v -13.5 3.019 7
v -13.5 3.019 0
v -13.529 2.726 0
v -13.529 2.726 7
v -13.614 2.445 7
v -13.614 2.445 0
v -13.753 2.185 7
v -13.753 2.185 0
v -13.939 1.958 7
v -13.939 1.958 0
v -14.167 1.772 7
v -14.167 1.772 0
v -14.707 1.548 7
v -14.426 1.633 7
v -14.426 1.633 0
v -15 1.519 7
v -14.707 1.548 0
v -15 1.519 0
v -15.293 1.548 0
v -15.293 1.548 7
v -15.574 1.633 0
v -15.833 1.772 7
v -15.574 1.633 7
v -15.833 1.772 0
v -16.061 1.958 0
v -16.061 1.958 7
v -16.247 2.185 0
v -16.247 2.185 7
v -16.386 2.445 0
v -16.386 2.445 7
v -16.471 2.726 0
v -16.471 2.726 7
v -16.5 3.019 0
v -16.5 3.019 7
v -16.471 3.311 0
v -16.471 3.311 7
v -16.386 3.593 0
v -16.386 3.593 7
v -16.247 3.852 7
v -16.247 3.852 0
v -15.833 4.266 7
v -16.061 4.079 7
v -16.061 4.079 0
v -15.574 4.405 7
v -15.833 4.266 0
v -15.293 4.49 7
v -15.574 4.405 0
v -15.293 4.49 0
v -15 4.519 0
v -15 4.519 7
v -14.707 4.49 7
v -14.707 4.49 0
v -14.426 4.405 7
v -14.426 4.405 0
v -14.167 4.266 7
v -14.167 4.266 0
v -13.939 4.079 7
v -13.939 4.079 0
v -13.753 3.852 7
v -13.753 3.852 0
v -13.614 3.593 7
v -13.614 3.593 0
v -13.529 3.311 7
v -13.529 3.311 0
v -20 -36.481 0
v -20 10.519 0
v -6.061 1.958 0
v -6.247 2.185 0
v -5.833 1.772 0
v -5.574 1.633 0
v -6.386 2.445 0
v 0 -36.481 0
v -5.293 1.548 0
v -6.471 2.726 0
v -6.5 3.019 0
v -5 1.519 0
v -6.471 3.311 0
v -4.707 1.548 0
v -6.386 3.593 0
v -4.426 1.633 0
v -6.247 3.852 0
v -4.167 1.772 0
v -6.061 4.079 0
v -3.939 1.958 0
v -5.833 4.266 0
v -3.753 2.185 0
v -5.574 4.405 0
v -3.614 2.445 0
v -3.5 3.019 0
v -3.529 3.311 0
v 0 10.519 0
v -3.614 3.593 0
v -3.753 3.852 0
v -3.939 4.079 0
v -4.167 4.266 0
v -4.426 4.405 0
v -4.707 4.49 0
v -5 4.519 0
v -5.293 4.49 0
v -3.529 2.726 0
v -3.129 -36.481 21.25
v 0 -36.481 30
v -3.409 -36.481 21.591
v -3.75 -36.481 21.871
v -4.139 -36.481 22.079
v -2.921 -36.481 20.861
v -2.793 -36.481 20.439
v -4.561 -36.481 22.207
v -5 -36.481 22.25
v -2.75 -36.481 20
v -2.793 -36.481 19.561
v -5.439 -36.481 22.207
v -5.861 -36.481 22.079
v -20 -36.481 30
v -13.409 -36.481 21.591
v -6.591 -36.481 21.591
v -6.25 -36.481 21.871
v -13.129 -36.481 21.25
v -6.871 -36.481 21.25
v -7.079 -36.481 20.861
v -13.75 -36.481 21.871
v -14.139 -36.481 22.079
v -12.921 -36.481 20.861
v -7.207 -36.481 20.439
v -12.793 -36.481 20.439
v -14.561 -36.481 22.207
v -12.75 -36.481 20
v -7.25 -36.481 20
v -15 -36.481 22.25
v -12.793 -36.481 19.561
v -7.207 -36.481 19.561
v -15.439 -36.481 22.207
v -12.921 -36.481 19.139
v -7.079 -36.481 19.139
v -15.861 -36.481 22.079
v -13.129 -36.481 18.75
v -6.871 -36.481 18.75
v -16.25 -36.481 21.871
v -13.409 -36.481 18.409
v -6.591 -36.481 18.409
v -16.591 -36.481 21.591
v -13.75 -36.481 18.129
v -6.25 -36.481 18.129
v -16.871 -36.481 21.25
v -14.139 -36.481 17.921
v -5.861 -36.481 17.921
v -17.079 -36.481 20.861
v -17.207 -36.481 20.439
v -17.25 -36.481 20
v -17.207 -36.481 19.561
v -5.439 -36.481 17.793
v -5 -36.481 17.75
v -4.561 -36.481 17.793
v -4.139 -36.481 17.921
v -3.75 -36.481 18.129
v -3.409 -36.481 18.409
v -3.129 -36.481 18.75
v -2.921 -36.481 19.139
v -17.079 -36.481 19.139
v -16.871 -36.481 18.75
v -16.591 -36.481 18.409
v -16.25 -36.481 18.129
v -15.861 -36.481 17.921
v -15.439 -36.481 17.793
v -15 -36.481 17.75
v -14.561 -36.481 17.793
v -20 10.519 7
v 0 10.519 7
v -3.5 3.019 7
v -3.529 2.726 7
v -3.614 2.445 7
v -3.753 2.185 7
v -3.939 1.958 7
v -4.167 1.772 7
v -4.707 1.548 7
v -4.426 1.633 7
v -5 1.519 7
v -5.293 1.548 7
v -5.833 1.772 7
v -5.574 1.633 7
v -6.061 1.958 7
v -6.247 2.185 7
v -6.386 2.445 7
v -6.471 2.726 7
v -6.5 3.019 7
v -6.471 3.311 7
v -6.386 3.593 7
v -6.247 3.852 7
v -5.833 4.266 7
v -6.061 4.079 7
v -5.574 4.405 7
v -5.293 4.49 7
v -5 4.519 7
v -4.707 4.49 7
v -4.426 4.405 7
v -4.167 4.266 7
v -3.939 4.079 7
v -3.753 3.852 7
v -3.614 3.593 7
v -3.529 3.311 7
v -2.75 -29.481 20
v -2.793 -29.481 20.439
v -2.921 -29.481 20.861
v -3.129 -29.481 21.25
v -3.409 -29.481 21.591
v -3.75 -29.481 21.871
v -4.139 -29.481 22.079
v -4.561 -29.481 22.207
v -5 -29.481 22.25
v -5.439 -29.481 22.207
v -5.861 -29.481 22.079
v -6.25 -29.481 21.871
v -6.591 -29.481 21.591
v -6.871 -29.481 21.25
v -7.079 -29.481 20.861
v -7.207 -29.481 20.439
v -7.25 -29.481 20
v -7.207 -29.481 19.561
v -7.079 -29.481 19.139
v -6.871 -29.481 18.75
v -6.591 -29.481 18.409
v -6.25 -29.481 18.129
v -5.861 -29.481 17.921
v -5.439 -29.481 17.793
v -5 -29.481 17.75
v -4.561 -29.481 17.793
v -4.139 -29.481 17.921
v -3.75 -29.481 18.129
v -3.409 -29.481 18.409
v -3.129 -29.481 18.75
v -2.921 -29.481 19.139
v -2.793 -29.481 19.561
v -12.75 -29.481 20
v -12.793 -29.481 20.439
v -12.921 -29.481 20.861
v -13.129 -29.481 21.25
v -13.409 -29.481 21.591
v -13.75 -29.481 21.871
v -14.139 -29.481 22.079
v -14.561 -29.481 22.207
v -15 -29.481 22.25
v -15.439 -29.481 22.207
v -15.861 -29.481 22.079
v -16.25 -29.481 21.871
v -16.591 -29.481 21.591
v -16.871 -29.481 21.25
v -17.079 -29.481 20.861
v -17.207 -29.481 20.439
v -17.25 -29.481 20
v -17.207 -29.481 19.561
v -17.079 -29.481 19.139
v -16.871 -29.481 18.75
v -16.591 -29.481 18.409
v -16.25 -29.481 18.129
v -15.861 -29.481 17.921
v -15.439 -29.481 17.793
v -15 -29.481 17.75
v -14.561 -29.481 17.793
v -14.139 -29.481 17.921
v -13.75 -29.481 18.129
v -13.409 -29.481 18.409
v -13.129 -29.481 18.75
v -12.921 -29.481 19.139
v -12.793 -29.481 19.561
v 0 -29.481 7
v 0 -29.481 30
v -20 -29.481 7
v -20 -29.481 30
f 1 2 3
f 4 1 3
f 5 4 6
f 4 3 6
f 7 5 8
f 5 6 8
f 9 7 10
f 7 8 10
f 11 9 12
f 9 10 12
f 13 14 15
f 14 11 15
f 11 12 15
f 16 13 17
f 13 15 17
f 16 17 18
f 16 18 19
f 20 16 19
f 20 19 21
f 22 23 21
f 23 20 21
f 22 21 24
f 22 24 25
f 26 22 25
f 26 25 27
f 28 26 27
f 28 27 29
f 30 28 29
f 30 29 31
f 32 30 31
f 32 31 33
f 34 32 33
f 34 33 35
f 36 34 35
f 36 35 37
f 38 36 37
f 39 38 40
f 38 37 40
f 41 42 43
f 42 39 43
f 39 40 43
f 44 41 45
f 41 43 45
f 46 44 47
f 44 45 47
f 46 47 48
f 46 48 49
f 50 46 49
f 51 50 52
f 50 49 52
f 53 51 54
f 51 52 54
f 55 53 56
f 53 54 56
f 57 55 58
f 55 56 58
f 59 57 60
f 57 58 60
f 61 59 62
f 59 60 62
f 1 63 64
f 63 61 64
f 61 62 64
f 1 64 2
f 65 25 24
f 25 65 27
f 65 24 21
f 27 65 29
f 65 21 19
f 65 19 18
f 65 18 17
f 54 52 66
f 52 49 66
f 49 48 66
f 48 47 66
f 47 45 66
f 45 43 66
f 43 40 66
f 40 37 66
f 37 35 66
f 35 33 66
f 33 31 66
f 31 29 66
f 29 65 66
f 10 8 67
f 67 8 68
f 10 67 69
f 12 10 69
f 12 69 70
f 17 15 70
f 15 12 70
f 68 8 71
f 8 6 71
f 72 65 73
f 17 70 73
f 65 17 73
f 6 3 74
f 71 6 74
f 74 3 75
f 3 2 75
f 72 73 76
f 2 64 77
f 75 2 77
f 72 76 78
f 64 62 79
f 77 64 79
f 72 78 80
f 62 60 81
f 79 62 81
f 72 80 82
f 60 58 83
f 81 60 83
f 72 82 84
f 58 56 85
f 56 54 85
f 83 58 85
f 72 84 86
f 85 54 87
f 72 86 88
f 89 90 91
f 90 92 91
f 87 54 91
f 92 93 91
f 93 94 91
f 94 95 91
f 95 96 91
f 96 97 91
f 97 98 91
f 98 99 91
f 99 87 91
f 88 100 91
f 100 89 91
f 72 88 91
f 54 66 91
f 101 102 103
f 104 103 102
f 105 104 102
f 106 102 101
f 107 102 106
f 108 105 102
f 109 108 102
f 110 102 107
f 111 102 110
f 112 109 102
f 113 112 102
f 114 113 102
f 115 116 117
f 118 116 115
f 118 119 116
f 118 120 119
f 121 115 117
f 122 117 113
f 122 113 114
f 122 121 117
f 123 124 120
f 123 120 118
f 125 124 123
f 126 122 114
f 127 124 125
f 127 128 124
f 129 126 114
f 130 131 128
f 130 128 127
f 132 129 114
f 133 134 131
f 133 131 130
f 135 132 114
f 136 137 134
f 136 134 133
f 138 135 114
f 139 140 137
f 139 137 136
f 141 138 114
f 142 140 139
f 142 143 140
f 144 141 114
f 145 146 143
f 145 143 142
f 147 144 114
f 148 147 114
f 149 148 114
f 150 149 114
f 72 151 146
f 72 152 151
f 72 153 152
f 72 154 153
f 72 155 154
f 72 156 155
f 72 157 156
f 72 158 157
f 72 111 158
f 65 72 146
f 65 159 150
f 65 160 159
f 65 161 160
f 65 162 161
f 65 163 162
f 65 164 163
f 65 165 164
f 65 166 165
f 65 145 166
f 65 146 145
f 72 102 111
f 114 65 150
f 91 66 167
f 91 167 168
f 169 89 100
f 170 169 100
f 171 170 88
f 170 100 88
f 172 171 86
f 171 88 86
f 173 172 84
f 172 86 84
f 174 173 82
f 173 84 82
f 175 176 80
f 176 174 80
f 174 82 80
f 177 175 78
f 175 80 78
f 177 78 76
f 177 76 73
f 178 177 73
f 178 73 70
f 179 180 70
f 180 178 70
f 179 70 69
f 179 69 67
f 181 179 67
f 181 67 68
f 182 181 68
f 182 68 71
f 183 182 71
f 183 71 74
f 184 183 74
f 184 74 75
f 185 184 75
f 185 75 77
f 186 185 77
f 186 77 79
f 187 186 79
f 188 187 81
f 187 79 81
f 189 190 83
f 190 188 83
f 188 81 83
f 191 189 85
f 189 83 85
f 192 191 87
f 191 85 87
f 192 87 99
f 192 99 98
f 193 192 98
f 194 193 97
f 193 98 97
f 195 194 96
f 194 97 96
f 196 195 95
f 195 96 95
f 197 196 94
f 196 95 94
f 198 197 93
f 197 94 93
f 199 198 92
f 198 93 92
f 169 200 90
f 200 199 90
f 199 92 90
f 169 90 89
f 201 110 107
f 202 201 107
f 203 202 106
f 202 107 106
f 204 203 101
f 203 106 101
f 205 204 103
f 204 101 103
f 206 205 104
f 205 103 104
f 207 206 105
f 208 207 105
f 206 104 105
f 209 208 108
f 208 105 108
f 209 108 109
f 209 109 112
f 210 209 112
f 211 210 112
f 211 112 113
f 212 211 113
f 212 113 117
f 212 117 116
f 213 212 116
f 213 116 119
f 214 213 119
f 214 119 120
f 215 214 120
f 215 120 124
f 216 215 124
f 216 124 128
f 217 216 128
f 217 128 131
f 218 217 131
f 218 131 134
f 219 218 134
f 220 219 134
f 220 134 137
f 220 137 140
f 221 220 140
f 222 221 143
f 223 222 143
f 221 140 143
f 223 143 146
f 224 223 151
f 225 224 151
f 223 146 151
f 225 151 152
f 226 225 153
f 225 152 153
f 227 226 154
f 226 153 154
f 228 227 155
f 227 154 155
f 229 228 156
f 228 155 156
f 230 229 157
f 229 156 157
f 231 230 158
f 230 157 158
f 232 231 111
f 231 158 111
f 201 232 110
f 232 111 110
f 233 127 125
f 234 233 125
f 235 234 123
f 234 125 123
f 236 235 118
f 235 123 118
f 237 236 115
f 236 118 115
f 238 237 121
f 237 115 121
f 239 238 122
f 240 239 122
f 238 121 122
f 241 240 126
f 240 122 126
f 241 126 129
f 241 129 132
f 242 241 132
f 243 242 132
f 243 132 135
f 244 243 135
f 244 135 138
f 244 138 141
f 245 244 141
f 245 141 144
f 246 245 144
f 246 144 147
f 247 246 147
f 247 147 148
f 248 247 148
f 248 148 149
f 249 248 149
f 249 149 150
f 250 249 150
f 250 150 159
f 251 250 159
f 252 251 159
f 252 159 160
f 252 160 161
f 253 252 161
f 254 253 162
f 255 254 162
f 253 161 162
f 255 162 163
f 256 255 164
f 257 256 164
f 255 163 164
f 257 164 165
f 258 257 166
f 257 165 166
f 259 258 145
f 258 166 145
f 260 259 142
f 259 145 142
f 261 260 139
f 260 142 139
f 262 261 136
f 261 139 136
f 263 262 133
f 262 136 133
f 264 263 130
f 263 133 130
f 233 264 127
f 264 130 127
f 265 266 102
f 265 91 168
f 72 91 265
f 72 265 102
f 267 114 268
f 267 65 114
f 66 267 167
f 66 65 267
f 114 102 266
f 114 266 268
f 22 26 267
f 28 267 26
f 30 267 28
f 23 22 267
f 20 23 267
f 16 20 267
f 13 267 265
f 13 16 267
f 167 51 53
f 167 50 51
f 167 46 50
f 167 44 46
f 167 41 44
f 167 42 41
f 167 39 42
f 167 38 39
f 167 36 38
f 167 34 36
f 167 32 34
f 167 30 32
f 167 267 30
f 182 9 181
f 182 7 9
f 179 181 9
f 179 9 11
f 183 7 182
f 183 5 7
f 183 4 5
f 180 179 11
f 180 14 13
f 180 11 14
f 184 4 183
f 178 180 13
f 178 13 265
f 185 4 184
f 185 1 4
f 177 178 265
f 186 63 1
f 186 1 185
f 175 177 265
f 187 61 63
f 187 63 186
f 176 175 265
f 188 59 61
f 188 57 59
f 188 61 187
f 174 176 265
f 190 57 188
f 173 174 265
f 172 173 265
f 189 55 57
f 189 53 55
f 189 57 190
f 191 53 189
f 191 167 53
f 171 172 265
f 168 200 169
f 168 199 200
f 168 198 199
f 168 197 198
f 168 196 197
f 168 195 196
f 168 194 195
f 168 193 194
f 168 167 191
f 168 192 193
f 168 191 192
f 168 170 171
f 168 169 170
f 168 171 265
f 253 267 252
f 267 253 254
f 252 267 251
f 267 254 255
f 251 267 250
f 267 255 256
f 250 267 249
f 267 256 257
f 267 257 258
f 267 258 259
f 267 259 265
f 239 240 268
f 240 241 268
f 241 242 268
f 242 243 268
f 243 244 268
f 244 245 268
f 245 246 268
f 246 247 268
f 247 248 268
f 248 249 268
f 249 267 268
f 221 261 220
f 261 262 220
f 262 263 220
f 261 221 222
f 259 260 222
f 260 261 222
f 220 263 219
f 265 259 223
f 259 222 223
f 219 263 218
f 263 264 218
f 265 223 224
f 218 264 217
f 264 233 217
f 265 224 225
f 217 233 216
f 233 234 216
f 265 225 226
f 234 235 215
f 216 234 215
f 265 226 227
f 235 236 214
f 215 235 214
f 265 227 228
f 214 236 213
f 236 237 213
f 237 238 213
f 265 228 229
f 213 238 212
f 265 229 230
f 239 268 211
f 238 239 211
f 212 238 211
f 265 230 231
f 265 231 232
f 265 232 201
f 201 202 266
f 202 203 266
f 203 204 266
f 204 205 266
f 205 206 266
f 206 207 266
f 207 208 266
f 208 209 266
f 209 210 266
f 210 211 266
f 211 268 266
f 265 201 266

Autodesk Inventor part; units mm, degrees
ref_plane "YZ Plane" through (0, 0, 0) normal (1, 0, 0) x (0, 1, 0)
ref_plane "XZ Plane" through (0, 0, 0) normal (0, 1, 0) x (-1, 0, 0)
ref_plane "XY Plane" through (0, 0, 0) normal (0, 0, 1) x (1, 0, 0)
sketch "Sketch1" plane through (0, 0, 0) normal (0, 0, 1) x (1, 0, 0)
  circle A0 centre (-5, 3.0188) radius 1.5
  circle A1 centre (-15, 3.0188) radius 1.5
  line L0 (0, -36.4812) -> (-20, -36.4812)
  line L1 (-20, -36.4812) -> (-20, 10.5188)
  line L2 (-20, 10.5188) -> (0, 10.5188)
  line L3 (0, 10.5188) -> (0, -36.4812)
  dimension "d0" = 3
  dimension "d1" = 3
  dimension "d2" = 10
  dimension "d3" = 20
  dimension "d4" = 7.5
  dimension "d5" = 7.5
  dimension "d6" = 5
  dimension "d7" = 47
extrude "Extrusion1" add sketch "Sketch1" along normal blind 7
sketch "Sketch2" plane through (-20, -36.4812, 0) normal (0, -1, 0) x (1, 0, 0)
  line L0 (0, 0) -> (0, 7) projected
  line L1 (0, 0) -> (20, 0)
  line L2 (20, 0) -> (20, 30)
  line L3 (20, 30) -> (0, 30)
  line L4 (0, 30) -> (0, 0)
  circle A0 centre (15, 20) radius 2.25
  circle A1 centre (5, 20) radius 2.25
  dimension "d10" = 30
  dimension "d11" = 4.5
  dimension "d12" = 4.5
  dimension "d13" = 10
  dimension "d14" = 5
  dimension "d15" = 10
extrude "Extrusion2" add sketch "Sketch2" against normal blind 7
equation "\"d5\" = d4"
equation "\"d12\" = d11"
properties part number "EndSwitchBracket"
